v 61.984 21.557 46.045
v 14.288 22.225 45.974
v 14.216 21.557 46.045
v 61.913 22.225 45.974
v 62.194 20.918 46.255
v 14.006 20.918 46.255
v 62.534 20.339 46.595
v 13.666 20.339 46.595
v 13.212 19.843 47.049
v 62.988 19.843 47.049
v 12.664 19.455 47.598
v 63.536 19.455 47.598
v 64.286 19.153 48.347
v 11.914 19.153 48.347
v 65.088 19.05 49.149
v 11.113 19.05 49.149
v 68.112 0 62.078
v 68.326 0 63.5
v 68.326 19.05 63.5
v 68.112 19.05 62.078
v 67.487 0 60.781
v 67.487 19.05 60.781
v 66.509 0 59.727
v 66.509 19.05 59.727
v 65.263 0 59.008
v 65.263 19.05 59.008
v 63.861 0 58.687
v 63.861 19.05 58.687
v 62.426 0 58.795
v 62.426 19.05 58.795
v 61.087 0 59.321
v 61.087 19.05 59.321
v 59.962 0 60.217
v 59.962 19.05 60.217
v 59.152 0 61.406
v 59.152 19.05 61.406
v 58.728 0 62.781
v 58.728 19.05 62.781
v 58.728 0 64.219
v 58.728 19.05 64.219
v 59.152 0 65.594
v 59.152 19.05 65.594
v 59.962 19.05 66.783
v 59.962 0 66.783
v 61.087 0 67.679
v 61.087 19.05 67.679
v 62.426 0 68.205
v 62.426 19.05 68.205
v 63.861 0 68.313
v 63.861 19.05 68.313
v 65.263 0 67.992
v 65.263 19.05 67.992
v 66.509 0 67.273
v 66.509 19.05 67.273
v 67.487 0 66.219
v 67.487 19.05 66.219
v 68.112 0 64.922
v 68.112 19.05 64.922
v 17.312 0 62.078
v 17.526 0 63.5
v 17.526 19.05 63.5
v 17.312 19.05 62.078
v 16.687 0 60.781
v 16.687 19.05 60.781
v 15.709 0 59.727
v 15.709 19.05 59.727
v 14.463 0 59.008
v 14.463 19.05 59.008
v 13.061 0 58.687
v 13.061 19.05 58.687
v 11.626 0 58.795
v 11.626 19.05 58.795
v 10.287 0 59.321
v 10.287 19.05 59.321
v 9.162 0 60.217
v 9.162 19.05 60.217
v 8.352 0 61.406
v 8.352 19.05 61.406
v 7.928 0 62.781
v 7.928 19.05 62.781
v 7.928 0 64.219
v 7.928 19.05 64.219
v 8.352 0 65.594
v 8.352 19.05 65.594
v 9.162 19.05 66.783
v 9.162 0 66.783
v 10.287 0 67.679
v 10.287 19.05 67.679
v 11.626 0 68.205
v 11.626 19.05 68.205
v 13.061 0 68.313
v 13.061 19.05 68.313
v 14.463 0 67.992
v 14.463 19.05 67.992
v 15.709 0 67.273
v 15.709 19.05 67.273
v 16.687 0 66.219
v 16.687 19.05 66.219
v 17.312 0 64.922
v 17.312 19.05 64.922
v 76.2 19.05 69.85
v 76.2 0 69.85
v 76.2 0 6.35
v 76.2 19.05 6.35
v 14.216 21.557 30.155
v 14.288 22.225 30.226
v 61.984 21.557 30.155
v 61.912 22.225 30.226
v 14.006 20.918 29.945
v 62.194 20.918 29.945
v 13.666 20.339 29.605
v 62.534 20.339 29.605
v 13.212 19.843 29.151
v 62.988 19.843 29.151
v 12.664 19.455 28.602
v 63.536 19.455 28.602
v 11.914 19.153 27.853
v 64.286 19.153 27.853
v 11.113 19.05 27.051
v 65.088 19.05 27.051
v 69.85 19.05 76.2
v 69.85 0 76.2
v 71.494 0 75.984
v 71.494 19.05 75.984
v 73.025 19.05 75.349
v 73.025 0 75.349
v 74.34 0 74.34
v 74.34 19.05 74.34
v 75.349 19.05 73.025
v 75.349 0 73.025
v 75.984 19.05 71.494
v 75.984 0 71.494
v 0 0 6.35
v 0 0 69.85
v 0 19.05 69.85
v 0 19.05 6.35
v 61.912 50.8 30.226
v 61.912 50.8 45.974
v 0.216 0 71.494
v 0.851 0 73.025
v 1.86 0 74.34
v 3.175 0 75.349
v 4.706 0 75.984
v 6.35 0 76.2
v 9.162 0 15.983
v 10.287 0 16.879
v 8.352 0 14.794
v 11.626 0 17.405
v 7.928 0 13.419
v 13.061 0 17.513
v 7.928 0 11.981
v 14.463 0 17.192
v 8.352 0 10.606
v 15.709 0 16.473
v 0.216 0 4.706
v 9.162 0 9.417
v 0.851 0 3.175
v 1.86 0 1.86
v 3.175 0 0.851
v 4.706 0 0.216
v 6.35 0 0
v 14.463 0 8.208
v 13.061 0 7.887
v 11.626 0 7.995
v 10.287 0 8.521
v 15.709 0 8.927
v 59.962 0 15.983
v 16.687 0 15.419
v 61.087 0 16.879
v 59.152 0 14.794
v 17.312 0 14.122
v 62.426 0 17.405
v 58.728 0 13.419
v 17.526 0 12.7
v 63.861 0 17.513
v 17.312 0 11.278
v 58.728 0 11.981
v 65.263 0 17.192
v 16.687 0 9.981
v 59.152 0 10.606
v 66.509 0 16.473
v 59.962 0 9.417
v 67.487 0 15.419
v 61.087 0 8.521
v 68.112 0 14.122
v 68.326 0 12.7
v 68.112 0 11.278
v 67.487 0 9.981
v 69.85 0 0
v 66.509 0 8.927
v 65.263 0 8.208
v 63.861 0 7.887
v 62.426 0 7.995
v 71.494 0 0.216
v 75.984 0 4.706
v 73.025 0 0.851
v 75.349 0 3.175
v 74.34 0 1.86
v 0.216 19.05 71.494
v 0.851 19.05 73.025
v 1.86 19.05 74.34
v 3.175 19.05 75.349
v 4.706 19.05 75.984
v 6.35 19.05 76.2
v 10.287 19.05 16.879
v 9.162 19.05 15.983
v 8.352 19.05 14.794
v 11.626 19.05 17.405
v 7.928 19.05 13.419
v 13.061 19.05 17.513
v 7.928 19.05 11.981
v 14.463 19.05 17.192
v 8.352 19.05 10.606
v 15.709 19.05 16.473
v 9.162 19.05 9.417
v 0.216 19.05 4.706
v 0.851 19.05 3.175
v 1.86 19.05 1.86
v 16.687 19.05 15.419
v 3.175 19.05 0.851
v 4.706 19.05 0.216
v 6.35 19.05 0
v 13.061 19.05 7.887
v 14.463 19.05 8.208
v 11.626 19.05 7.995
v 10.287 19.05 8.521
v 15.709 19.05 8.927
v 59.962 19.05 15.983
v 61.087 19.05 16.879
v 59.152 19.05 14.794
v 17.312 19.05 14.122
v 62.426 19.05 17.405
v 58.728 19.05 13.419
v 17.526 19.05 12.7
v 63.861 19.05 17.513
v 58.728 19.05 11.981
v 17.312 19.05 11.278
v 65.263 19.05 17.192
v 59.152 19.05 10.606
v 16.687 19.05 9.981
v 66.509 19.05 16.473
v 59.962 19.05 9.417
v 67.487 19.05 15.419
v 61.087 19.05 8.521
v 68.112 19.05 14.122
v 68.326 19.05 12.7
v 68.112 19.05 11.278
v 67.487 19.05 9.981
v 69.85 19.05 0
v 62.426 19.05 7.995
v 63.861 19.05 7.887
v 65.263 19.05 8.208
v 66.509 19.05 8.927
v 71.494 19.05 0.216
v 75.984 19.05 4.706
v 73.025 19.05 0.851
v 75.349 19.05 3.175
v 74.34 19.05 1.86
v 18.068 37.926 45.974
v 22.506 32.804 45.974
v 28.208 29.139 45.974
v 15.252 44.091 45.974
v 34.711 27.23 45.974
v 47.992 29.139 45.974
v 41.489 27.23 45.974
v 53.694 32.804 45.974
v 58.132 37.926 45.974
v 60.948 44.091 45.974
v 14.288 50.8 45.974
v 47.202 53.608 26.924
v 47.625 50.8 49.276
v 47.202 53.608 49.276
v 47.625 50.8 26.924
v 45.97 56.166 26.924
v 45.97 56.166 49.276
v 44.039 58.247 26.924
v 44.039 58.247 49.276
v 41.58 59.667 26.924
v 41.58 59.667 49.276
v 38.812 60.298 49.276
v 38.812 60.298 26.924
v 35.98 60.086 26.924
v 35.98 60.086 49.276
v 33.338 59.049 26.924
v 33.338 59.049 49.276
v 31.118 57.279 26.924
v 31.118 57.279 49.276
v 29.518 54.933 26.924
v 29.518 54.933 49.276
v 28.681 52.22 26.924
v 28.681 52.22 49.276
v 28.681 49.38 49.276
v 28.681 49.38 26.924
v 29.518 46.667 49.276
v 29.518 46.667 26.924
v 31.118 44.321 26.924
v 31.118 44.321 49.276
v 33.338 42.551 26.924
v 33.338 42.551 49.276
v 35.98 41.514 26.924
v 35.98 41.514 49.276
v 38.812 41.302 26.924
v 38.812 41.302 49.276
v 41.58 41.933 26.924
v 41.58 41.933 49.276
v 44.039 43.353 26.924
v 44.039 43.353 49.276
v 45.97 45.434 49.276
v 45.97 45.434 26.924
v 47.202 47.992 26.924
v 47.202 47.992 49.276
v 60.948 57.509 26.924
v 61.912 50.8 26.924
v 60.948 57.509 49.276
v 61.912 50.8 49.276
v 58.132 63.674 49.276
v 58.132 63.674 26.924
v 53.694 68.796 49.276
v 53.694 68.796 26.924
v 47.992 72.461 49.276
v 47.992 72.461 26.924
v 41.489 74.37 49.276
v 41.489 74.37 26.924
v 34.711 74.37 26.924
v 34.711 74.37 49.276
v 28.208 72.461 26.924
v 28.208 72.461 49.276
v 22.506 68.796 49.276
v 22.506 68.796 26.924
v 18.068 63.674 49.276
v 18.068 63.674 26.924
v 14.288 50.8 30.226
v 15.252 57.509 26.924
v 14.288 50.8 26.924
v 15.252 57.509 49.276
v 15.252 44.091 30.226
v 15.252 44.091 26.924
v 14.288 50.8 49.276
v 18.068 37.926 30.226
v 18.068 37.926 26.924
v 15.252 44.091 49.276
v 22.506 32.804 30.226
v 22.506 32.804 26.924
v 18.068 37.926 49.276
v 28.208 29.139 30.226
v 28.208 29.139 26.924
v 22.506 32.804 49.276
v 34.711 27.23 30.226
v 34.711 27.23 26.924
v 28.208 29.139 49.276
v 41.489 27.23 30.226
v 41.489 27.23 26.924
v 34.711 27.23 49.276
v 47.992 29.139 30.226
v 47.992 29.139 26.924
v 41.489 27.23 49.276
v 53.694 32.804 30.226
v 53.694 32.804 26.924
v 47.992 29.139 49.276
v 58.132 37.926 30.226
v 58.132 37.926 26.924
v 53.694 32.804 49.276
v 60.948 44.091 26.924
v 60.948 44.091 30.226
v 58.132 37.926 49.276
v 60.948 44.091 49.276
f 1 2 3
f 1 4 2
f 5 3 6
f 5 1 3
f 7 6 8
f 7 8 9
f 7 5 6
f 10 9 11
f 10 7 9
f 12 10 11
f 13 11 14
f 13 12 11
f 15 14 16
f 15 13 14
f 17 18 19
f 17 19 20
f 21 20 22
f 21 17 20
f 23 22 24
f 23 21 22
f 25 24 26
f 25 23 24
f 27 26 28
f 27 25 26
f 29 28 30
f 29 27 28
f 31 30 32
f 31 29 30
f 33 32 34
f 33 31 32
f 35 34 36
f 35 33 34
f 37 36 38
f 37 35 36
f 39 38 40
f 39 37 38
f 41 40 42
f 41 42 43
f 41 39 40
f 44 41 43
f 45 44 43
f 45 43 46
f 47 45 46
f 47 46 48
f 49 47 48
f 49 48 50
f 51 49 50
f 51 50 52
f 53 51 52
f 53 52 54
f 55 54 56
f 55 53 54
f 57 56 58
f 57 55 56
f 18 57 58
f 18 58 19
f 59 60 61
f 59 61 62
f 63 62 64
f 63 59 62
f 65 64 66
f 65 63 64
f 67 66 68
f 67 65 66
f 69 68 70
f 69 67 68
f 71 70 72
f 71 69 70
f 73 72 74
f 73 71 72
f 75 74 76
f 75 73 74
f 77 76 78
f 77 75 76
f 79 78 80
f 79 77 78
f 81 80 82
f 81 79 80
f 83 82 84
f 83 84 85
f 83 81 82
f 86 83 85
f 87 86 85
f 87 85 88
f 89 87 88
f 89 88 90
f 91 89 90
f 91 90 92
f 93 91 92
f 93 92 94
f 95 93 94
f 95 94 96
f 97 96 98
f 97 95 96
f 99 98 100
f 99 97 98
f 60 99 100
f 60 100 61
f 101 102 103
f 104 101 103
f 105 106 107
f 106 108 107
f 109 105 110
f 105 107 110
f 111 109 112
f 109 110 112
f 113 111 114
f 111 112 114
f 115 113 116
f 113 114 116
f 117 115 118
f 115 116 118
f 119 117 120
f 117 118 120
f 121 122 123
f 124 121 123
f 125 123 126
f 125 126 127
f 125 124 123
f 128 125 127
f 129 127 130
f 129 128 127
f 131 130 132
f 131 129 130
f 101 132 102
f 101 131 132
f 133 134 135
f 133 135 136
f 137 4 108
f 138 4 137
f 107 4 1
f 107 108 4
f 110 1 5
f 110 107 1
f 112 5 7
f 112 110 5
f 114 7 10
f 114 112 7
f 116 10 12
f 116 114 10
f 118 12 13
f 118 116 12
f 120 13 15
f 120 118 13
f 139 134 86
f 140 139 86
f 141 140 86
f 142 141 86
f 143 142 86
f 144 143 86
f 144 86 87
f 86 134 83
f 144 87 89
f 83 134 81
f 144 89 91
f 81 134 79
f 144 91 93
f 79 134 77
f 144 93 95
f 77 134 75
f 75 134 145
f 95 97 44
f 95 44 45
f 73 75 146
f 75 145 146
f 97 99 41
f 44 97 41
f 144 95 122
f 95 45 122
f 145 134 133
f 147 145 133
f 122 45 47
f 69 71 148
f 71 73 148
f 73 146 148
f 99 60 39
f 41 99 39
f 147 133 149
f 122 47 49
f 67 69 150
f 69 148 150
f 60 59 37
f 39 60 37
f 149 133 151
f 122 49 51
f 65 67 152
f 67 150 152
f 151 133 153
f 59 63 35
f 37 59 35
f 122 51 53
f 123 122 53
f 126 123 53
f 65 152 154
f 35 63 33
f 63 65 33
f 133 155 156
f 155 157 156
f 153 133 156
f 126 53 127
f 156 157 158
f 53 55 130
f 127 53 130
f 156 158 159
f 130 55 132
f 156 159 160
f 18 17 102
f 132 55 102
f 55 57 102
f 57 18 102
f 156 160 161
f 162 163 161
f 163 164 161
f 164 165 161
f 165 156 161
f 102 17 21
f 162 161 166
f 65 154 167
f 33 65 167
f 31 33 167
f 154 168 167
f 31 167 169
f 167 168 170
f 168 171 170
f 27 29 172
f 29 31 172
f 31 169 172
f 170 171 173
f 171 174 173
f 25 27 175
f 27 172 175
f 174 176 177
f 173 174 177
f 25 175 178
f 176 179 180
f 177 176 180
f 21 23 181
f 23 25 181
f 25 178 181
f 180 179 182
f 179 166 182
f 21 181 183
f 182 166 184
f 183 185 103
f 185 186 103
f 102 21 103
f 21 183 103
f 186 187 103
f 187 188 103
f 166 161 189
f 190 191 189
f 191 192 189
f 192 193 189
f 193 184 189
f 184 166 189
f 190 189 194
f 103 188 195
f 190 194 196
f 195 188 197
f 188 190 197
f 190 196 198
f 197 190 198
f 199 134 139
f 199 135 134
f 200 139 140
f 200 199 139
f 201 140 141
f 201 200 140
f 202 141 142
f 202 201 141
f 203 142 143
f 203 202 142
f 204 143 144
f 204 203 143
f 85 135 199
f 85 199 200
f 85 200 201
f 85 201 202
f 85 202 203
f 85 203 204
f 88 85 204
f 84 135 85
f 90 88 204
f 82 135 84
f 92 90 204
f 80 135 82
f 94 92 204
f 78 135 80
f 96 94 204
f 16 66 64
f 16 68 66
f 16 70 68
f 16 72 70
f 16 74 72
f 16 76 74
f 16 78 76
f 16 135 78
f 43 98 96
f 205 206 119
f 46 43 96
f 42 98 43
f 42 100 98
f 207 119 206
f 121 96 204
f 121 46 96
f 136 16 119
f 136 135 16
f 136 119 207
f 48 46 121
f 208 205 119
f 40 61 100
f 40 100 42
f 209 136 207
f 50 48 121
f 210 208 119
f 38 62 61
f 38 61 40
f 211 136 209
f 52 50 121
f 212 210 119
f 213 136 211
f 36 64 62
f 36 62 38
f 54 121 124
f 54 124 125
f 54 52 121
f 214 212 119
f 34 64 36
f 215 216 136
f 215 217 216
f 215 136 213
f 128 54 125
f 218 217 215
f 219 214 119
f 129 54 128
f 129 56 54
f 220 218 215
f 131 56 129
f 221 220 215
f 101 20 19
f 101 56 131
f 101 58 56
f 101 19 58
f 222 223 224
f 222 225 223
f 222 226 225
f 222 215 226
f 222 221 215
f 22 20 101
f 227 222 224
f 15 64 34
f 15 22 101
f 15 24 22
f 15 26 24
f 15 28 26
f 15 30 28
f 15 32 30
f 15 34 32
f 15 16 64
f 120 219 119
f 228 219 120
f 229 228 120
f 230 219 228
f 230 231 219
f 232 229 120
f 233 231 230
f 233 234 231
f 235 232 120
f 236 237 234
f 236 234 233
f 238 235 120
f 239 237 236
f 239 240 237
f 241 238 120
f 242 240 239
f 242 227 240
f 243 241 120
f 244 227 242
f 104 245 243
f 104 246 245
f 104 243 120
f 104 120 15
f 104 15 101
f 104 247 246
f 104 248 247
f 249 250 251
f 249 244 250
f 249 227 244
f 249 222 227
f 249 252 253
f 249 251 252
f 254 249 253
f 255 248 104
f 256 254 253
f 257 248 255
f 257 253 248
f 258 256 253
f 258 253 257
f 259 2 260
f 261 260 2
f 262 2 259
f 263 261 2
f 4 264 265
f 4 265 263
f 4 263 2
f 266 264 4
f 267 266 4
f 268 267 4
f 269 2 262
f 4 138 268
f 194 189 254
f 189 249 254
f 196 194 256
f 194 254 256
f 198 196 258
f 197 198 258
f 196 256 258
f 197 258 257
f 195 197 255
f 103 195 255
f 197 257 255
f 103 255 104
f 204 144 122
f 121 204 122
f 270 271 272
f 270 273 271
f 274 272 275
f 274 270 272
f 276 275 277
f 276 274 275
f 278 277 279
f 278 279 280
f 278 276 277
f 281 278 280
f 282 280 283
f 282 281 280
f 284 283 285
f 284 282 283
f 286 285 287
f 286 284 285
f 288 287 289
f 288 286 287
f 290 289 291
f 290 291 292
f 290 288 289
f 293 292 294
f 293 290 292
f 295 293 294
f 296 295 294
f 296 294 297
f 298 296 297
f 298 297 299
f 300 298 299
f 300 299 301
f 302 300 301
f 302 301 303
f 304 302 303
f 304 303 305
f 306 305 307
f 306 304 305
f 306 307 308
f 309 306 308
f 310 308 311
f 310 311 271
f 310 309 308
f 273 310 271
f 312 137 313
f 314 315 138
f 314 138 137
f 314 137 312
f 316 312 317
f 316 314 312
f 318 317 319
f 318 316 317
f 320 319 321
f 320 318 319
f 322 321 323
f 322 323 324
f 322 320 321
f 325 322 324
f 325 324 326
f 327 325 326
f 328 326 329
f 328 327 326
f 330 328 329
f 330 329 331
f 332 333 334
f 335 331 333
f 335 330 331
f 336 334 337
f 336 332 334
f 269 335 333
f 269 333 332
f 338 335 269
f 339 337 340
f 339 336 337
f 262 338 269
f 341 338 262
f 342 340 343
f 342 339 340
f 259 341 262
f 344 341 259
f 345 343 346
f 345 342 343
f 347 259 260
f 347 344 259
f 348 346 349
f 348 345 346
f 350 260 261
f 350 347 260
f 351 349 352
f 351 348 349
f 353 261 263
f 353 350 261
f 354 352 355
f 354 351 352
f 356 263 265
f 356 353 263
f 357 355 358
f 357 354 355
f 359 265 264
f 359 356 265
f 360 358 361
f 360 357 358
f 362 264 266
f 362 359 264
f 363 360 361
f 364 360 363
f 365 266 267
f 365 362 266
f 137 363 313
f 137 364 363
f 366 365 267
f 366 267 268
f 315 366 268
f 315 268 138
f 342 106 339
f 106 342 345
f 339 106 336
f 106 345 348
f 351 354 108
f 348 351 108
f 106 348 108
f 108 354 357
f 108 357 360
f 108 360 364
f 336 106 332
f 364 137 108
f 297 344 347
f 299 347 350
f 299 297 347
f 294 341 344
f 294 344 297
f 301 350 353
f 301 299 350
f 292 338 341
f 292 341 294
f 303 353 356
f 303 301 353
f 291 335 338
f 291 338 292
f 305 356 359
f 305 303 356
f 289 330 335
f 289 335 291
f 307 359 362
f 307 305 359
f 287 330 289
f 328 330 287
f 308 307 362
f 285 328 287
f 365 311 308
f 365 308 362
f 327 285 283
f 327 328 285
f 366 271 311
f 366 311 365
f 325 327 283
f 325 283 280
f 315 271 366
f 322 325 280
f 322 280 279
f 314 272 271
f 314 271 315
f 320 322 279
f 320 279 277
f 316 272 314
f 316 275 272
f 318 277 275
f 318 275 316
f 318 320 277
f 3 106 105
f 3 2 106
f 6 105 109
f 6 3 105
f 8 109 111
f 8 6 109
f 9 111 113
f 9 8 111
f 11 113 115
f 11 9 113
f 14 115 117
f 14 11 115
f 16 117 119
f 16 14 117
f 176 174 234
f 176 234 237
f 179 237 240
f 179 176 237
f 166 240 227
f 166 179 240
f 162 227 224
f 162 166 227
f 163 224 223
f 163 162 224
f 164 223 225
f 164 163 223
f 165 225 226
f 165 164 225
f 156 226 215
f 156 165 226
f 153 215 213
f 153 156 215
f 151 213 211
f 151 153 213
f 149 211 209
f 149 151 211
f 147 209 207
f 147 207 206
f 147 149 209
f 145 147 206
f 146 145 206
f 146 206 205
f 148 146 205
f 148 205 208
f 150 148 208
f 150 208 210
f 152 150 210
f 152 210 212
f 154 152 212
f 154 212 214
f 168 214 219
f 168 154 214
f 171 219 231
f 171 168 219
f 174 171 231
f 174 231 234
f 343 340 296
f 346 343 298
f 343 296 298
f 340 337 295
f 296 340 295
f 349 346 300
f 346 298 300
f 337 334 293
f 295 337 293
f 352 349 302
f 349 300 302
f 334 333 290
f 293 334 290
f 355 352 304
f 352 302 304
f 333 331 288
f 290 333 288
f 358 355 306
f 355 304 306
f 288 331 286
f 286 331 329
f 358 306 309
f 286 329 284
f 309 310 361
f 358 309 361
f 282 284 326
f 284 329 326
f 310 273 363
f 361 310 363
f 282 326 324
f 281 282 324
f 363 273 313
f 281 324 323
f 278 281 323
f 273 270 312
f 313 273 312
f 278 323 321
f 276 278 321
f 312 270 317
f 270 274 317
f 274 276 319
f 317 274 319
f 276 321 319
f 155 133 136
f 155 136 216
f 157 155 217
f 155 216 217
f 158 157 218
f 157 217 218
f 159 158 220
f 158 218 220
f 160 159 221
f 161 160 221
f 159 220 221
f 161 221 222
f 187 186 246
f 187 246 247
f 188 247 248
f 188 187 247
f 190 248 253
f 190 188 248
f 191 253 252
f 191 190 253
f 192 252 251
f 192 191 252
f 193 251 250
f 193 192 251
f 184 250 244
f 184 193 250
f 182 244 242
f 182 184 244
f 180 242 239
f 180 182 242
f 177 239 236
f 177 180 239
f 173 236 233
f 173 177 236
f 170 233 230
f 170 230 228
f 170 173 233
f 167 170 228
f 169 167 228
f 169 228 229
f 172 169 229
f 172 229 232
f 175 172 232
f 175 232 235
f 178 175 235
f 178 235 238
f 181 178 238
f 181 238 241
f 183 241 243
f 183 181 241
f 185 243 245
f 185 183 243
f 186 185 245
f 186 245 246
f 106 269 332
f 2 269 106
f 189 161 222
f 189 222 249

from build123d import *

# Parameters (mm, degrees)
SKETCH1_W           = 76.2
SKETCH1_H           = 76.2
SKETCH1_R           = 4.826
BOSS_EXTRUDE1_DEPTH = 19.05
BOSS_EXTRUDE4_DEPTH = 7.874
SKETCH2_5_R         = 9.525
BOSS_EXTRUDE5_DEPTH = 11.176
FILLET1_R           = 3.175
FILLET2_R           = 6.35


with BuildPart() as part:
    # Sketch1 → Boss-Extrude1 (new body)
    with BuildSketch(Plane(origin=(0, 0, 0), x_dir=(1, 0, 0), z_dir=(0, 1, 0))):
        with Locations((38.1, -38.1)):
            Rectangle(SKETCH1_W, SKETCH1_H)
        with Locations((63.5, -63.5)):
            Circle(SKETCH1_R, mode=Mode.SUBTRACT)
        with Locations((12.7, -63.5)):
            Circle(SKETCH1_R, mode=Mode.SUBTRACT)
        with Locations((63.5, -12.7)):
            Circle(SKETCH1_R, mode=Mode.SUBTRACT)
        with Locations((12.7, -12.7)):
            Circle(SKETCH1_R, mode=Mode.SUBTRACT)
    extrude(amount=BOSS_EXTRUDE1_DEPTH)

    # Sketch2 → Boss-Extrude4 (add, symmetric)
    with BuildSketch(Plane.XY.offset(38.1)):
        with BuildLine():
            ThreePointArc((61.9125, 50.8), (38.1, 26.9875), (14.2875, 50.8))
            Line((14.2875, 50.8), (14.2875, 19.05))
            Line((14.2875, 19.05), (61.9125, 19.05))
            Line((61.9125, 19.05), (61.9125, 50.8))
        make_face()
    extrude(amount=BOSS_EXTRUDE4_DEPTH, both=True)

    # Sketch2<5> → Boss-Extrude5 (add, symmetric)
    with BuildSketch(Plane.XY.offset(38.1)):
        with BuildLine():
            ThreePointArc((61.9125, 50.8), (38.1, 74.6125), (14.2875, 50.8))
            ThreePointArc((14.2875, 50.8), (38.1, 26.9875), (61.9125, 50.8))
        make_face()
        with Locations((38.1, 50.8)):
            Circle(SKETCH2_5_R, mode=Mode.SUBTRACT)
    extrude(amount=BOSS_EXTRUDE5_DEPTH, both=True)

    # Fillet1
    fillet1_edges = [part.edges().sort_by_distance(p)[0] for p in [
        (38.1, 19.05, 30.226),
        (14.2875, 19.05, 38.1),
        (38.1, 19.05, 45.974),
        (61.9125, 19.05, 38.1),
    ]]
    fillet(fillet1_edges, radius=FILLET1_R)

    # Fillet2
    fillet2_edges = [part.edges().sort_by_distance(p)[0] for p in [
        (76.2, 9.525, 76.2),
        (0, 9.525, 76.2),
        (76.2, 9.525, 0),
        (0, 9.525, 0),
    ]]
    fillet(fillet2_edges, radius=FILLET2_R)


solid = part.part
